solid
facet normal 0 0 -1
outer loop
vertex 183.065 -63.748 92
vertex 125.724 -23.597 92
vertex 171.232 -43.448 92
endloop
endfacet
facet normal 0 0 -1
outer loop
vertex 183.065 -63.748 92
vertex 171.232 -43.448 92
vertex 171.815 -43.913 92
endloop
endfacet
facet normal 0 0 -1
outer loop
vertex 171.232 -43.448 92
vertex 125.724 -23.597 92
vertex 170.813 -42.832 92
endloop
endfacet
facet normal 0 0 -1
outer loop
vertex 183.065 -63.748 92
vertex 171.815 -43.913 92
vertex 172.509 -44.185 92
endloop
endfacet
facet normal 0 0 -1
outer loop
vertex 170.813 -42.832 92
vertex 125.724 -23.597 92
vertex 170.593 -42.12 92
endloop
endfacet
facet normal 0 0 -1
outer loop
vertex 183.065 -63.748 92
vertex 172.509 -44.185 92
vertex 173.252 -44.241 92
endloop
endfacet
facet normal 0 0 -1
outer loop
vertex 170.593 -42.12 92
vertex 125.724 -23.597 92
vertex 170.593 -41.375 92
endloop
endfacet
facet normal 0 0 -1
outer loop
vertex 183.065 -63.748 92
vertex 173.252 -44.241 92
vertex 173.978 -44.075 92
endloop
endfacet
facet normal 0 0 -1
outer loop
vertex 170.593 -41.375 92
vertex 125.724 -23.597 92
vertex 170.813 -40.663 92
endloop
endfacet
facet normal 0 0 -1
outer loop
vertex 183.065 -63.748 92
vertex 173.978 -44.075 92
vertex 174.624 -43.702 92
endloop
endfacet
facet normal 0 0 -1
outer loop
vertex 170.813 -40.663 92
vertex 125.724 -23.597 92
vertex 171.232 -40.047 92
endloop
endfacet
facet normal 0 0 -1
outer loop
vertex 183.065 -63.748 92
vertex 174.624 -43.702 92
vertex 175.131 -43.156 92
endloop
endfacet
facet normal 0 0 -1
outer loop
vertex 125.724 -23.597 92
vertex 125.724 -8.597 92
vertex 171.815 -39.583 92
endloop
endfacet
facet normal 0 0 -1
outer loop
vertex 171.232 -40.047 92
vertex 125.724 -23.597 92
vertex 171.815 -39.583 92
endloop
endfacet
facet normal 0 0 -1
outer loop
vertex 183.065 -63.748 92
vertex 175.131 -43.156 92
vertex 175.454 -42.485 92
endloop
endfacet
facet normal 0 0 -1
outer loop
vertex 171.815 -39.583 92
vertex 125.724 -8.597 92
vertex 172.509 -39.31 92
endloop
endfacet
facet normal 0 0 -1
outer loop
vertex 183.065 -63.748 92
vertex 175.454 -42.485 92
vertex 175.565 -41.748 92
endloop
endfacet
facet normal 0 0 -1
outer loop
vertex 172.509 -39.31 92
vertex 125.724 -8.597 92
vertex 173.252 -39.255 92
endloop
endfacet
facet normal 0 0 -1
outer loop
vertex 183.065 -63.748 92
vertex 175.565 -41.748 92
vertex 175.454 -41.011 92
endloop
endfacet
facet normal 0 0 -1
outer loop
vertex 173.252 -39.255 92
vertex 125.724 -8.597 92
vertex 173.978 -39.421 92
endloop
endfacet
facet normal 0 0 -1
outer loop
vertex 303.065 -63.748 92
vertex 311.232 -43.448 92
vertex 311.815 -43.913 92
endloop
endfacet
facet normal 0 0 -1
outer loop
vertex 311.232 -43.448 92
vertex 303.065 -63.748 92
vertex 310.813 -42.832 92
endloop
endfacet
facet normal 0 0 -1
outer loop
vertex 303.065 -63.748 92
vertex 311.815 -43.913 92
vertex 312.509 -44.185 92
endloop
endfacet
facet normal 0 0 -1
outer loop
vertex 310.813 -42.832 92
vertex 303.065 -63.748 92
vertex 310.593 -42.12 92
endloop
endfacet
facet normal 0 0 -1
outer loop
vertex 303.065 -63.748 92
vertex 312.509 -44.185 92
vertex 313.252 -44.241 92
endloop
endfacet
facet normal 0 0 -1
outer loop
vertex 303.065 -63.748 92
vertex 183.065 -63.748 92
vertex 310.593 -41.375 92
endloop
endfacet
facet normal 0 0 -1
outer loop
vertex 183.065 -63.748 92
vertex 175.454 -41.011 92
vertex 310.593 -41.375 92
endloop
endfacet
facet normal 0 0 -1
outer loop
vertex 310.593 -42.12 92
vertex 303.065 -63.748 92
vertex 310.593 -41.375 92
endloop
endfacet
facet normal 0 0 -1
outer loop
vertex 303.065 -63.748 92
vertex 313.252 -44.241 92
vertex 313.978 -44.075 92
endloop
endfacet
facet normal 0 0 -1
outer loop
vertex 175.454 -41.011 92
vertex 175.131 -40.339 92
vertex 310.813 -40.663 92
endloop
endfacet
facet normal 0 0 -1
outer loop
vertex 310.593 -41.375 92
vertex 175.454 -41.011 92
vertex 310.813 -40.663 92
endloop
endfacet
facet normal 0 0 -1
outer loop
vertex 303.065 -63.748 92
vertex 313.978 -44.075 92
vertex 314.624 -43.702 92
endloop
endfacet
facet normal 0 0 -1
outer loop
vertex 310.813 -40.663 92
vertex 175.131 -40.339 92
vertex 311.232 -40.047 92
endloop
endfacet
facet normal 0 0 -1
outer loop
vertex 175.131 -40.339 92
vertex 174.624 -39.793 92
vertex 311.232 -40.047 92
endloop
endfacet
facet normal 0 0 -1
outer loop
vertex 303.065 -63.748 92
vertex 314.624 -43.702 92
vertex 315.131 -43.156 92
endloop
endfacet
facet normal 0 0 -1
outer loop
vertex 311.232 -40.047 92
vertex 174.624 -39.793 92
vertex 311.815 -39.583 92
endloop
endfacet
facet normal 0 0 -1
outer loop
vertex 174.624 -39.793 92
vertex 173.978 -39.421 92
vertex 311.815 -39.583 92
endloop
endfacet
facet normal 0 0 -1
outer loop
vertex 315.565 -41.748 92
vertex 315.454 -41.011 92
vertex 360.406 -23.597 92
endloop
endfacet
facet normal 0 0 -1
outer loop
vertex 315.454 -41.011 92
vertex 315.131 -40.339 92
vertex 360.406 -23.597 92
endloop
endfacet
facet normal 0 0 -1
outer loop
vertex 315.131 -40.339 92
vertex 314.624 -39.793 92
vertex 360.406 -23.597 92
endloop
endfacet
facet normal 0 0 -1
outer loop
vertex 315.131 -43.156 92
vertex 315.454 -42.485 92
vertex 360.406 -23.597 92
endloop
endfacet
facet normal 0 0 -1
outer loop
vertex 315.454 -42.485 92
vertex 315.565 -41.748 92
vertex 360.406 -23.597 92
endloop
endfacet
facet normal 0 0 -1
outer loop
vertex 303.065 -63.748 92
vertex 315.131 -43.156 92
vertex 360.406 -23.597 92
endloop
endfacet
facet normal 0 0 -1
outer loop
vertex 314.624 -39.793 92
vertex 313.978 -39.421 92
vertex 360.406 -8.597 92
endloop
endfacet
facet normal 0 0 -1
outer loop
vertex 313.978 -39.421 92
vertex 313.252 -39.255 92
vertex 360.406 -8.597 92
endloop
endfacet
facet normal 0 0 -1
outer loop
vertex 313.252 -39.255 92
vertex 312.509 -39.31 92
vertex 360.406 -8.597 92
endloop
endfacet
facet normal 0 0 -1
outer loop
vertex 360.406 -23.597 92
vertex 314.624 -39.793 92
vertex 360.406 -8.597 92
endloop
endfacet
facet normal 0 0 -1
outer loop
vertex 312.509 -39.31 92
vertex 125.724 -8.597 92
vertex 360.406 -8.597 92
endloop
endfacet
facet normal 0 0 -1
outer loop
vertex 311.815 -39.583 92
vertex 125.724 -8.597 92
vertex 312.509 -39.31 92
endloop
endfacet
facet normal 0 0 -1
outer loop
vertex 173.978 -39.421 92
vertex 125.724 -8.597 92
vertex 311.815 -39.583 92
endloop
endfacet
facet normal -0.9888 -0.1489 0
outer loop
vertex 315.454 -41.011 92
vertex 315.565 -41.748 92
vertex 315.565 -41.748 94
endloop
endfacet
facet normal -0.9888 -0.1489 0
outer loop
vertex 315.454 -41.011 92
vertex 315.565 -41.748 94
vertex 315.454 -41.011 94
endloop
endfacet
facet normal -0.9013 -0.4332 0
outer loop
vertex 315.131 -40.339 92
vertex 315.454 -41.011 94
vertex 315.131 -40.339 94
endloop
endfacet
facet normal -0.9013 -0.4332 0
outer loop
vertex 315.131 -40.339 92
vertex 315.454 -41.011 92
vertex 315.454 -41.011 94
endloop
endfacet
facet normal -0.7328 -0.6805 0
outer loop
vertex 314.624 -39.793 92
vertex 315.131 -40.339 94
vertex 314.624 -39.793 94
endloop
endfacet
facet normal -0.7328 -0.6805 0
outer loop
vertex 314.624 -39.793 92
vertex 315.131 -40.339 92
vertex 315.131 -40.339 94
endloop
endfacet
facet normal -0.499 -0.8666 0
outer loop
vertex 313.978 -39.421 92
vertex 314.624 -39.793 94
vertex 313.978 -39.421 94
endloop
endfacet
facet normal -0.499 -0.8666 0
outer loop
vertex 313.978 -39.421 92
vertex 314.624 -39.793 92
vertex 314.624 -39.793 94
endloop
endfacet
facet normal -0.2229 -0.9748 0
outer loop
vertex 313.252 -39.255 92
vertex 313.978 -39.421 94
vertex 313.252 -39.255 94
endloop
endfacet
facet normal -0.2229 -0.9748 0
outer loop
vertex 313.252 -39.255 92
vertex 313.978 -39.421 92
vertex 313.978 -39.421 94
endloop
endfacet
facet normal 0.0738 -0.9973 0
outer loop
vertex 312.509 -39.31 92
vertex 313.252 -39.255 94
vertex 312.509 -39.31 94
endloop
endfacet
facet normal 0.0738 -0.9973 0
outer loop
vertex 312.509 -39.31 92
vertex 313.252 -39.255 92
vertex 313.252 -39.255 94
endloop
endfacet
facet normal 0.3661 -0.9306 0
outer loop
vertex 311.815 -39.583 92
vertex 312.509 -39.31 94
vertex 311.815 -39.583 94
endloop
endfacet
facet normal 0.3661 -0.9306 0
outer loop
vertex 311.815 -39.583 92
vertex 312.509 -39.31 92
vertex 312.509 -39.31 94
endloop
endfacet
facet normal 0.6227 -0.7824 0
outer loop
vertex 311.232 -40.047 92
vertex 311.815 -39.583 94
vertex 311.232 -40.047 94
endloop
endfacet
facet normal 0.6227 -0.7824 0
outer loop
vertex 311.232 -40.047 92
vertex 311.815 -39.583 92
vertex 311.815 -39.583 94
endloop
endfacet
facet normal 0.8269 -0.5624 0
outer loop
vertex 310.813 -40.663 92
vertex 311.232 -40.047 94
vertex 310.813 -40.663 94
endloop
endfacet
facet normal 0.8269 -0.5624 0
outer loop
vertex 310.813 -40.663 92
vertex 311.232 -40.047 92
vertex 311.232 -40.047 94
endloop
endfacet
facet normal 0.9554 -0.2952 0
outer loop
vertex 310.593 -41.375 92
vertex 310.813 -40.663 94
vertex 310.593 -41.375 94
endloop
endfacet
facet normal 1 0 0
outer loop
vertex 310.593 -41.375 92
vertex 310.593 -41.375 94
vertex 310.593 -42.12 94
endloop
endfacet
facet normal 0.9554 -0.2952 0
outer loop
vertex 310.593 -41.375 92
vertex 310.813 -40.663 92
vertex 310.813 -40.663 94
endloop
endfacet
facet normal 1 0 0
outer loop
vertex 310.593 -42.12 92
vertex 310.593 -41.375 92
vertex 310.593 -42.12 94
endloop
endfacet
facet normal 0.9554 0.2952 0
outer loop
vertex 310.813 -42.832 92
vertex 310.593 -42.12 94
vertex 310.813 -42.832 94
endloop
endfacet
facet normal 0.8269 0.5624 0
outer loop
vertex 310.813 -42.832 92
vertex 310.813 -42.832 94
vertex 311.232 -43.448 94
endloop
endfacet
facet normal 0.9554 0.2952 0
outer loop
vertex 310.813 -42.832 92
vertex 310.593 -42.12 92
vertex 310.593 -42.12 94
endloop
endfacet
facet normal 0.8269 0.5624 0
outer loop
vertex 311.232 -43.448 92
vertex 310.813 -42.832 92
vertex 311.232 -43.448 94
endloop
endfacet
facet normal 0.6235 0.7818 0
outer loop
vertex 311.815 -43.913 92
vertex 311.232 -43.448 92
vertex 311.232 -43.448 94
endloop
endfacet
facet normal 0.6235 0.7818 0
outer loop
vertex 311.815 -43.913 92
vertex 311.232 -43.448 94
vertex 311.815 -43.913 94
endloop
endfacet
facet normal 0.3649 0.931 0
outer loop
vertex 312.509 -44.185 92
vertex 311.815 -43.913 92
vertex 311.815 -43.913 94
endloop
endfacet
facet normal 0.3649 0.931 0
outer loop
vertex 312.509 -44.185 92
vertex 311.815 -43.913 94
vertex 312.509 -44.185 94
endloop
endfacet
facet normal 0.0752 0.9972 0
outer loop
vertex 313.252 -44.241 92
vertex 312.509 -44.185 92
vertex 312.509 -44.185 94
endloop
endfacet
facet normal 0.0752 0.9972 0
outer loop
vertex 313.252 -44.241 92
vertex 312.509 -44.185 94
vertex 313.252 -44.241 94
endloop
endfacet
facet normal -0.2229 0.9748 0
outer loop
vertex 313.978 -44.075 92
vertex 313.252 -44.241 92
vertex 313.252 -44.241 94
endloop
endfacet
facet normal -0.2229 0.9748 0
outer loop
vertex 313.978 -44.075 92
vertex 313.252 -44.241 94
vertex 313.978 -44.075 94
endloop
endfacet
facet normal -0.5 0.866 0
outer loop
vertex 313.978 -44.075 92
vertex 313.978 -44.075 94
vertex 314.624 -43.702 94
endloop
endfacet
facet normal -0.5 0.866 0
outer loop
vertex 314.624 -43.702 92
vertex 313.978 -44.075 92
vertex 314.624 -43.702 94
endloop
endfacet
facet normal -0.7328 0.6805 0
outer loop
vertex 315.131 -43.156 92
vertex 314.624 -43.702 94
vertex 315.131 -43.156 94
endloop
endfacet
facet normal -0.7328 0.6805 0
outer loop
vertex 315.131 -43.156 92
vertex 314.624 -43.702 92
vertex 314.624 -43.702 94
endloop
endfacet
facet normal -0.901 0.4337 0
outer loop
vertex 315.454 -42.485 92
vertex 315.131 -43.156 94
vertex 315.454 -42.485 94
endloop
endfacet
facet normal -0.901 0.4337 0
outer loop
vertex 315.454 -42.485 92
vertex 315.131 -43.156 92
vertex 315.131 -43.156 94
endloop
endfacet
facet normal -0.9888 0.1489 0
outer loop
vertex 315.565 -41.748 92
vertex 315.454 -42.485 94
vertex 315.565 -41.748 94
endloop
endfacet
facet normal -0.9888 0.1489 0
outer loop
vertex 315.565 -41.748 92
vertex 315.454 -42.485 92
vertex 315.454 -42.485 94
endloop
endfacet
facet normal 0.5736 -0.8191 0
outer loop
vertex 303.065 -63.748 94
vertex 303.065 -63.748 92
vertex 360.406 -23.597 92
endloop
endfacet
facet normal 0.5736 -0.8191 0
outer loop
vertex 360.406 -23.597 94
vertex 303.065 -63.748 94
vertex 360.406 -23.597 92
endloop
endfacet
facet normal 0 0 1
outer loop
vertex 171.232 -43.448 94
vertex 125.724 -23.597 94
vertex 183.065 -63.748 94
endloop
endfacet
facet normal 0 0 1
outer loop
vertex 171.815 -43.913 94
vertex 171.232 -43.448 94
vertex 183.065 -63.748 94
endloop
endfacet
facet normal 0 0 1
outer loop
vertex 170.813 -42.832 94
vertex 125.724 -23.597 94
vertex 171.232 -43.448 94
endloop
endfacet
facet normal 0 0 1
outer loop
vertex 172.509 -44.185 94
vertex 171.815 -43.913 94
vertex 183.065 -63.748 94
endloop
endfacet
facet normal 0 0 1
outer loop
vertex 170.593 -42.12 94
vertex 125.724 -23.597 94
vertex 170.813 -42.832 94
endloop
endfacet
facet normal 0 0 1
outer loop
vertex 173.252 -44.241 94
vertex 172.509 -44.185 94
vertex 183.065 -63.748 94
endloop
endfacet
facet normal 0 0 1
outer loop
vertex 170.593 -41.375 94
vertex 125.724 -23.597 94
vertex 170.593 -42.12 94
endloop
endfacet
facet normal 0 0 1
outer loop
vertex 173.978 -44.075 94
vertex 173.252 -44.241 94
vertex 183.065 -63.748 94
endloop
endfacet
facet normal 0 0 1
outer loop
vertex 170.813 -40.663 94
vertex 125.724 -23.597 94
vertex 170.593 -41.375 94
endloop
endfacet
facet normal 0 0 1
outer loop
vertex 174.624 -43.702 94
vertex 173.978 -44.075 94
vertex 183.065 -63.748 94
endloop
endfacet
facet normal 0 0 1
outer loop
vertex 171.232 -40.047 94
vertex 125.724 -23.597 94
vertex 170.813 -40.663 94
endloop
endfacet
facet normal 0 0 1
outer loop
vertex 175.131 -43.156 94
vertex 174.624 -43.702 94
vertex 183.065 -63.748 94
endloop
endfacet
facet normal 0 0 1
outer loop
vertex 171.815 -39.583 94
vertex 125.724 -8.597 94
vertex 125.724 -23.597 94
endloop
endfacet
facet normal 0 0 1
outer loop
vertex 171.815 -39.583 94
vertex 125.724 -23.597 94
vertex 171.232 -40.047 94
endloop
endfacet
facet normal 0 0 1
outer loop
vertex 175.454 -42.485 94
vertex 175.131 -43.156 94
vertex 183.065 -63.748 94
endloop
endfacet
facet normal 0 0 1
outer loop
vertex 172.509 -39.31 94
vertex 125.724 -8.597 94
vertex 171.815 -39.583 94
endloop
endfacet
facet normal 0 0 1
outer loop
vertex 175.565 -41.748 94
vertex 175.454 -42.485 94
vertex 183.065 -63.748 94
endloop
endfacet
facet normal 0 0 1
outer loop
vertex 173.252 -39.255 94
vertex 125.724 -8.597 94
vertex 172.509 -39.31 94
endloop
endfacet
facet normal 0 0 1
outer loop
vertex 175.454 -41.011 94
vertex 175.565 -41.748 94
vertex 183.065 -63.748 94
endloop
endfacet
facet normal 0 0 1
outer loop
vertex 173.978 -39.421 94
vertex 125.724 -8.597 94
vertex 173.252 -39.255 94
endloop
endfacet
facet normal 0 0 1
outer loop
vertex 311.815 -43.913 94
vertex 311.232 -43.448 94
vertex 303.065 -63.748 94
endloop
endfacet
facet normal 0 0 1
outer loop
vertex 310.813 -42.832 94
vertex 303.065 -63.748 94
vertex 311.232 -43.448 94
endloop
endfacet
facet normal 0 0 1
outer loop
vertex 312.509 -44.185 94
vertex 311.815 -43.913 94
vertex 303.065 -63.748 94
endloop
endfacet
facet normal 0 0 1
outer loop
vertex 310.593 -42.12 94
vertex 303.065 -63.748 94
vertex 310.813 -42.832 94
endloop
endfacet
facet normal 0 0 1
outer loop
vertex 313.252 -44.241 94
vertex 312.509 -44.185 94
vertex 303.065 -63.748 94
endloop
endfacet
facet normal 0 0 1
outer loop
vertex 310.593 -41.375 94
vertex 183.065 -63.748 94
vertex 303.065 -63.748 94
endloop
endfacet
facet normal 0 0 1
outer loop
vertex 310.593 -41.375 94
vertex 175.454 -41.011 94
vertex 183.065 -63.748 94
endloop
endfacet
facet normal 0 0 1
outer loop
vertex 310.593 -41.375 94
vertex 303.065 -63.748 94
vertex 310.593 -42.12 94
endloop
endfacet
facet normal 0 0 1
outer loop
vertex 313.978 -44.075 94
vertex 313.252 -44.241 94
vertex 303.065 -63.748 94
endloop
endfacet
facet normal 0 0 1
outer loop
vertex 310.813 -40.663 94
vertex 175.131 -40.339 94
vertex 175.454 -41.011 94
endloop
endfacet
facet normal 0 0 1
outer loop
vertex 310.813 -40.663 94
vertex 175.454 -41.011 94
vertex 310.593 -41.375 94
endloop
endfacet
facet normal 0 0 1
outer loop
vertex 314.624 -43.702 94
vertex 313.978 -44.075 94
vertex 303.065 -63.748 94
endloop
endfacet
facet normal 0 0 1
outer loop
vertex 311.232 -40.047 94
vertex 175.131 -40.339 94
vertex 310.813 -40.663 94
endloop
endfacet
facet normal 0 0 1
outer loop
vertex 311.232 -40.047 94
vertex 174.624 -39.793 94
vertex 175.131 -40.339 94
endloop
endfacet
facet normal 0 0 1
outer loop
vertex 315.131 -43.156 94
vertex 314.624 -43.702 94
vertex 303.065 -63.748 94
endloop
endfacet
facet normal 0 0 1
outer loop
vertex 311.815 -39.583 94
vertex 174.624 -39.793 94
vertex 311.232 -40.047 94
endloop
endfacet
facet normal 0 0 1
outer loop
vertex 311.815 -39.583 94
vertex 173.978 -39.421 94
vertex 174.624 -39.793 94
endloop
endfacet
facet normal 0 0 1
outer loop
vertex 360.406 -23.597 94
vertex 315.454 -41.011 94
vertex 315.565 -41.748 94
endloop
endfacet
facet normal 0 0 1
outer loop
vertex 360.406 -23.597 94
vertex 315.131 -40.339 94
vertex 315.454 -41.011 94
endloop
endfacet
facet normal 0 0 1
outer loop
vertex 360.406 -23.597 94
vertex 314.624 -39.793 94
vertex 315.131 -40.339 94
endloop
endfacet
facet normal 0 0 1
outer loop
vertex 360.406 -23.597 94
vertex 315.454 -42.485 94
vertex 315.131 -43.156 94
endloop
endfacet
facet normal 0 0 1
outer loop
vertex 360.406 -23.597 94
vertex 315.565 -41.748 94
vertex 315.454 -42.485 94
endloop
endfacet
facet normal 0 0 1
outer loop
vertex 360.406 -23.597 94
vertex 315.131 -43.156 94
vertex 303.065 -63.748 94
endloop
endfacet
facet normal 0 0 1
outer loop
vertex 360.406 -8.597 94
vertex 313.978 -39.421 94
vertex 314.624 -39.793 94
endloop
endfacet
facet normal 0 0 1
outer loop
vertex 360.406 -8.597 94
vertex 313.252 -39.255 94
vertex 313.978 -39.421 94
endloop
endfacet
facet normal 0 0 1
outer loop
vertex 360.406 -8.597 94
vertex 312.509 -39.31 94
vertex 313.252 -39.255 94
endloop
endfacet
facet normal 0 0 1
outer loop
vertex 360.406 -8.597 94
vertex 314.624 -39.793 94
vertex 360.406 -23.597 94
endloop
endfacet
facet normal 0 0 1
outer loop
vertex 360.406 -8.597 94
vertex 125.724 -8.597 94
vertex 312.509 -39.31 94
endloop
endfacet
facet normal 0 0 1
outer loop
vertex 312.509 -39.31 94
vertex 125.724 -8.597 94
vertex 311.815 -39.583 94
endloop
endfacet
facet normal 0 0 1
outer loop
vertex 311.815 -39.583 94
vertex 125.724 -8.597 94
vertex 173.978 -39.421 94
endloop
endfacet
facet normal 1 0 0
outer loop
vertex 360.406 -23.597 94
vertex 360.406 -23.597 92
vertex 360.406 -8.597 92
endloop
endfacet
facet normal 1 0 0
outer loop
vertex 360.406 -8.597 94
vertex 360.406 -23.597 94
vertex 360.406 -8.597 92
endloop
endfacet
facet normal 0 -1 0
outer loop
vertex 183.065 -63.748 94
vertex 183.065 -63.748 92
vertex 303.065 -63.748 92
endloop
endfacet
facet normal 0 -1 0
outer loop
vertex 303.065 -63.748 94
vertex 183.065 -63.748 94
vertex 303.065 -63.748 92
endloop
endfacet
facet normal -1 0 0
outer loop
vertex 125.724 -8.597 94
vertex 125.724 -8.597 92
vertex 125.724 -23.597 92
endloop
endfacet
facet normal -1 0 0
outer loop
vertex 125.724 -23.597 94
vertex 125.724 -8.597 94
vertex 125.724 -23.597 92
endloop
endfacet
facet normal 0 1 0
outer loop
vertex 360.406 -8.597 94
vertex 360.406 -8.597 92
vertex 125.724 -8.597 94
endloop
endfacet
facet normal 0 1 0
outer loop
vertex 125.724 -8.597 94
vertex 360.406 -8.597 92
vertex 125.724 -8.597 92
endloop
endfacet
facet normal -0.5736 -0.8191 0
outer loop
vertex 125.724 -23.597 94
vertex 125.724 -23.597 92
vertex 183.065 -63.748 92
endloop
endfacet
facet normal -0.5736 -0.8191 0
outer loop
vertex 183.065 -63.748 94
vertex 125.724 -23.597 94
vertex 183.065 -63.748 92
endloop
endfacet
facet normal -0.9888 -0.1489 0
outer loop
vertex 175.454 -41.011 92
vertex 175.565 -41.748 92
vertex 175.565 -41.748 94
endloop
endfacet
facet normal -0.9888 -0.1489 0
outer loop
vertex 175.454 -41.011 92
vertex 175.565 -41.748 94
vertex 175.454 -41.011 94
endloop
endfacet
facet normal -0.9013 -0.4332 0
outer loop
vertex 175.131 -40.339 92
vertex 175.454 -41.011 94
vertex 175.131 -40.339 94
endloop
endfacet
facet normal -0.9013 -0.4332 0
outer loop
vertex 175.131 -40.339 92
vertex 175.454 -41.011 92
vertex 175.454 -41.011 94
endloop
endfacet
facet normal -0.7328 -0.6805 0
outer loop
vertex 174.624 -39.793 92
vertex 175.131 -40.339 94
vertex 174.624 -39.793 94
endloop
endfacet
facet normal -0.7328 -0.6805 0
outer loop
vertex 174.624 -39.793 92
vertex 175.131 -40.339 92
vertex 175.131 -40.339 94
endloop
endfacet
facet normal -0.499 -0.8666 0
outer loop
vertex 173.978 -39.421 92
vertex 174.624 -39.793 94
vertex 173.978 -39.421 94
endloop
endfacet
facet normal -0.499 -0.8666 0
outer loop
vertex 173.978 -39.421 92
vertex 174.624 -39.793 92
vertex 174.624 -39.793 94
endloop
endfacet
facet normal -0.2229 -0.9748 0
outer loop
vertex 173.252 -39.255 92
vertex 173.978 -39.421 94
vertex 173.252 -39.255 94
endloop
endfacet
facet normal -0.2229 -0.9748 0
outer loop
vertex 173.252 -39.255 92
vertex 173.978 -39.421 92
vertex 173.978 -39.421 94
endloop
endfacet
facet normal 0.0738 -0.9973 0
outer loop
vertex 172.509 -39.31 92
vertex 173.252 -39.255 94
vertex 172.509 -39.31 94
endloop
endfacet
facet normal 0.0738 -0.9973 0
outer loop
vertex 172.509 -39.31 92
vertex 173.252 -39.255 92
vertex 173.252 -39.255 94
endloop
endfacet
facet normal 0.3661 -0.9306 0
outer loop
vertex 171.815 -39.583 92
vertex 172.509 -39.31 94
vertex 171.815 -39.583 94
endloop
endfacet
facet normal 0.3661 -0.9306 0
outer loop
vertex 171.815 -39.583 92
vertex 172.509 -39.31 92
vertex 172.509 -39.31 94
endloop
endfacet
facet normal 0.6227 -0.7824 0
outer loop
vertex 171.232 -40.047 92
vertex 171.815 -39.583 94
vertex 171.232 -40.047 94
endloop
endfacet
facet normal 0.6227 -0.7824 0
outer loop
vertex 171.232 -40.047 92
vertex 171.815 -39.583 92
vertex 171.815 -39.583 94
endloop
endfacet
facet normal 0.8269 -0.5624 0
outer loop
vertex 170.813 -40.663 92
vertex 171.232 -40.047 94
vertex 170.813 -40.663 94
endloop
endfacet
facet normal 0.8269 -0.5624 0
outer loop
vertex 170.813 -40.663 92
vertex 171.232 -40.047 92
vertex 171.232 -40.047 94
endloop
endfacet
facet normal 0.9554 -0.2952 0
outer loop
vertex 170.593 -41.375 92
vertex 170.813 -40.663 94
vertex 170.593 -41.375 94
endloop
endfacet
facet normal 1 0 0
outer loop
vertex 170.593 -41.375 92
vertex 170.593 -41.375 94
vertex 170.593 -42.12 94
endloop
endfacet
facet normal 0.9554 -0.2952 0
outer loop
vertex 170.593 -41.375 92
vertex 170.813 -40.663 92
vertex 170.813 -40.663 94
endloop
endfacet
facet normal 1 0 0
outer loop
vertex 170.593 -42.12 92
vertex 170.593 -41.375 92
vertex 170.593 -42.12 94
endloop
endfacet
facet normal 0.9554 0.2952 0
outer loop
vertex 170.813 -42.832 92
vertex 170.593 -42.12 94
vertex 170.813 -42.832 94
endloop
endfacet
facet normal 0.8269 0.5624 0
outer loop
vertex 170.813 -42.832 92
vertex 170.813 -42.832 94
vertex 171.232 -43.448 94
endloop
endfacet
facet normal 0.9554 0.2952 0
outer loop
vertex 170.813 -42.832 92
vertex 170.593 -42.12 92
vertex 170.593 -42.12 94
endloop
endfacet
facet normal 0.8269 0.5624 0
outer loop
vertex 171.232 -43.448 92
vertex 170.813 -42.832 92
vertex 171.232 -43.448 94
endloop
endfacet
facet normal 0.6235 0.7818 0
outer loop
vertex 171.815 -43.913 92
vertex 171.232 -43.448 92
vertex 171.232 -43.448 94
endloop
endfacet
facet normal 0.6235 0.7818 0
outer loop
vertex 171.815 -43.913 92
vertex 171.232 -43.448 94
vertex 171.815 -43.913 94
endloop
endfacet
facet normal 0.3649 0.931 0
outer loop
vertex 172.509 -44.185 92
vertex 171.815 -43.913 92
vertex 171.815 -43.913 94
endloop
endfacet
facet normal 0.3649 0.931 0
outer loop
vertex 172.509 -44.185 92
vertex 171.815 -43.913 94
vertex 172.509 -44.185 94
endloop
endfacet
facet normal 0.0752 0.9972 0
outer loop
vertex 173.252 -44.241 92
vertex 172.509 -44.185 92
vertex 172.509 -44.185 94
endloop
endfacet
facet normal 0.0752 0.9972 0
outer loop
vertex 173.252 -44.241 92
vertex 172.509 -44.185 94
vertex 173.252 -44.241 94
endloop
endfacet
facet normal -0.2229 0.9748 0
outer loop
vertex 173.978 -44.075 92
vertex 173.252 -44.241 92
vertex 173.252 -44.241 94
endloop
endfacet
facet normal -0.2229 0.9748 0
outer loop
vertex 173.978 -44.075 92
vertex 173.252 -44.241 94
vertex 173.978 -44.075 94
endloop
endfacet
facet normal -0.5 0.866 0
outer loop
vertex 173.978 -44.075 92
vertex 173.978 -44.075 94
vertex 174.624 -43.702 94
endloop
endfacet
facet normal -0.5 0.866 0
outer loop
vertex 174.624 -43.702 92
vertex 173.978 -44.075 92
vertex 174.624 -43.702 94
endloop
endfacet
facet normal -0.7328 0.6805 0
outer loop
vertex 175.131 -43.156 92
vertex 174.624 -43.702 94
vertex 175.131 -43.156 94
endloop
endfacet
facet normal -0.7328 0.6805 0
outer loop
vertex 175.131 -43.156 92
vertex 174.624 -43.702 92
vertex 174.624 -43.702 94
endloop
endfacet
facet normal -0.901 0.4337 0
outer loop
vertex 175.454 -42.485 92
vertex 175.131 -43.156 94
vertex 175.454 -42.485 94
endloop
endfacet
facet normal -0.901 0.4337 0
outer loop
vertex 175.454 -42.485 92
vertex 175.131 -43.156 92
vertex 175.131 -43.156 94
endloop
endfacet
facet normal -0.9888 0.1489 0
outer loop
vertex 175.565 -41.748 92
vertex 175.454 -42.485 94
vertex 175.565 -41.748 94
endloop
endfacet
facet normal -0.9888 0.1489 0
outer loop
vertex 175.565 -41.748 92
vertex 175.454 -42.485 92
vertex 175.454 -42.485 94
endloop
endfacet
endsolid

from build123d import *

# Parameters (mm, degrees)
SKETCH1_R           = 2.5
BOSS_EXTRUDE1_DEPTH = 2
CUT_EXTRUDE1_DEPTH  = 10


with BuildPart() as part:
    # Sketch1 → Boss-Extrude1 (new body)
    with BuildSketch(Plane.XY.offset(92)):
        Polygon((26.130057398, -8.597379557), (26.130057398, -23.597379557), (83.470700498, -63.747730101), (402.6593569, -63.747730101), (460, -23.597379557), (460, -8.597379557), align=None)
        with Locations((173.065028699, -41.747730101)):
            Circle(SKETCH1_R, mode=Mode.SUBTRACT)
        with Locations((313.065028699, -41.747730101)):
            Circle(SKETCH1_R, mode=Mode.SUBTRACT)
    extrude(amount=BOSS_EXTRUDE1_DEPTH)

    # Sketch2 → Cut-Extrude1 (cut)
    with BuildSketch(Plane(origin=(0, 0, 92), x_dir=(-1, 0, 0), z_dir=(0, 0, -1))):
        Polygon((-381.8278919, -8.597379557), (-360.405671799, -23.597379557), (-360.405671799, -8.597379557), align=None)
        Polygon((-303.065028699, -63.747730101), (-360.405671799, -23.597379557), (-381.8278919, -8.597379557), (-460, -8.597379557), (-460, -23.597379557), (-402.6593569, -63.747730101), align=None)
        Polygon((-125.724385599, -8.597379557), (-125.724385599, -23.597379557), (-104.302165498, -8.597379557), align=None)
        Polygon((-104.302165498, -8.597379557), (-125.724385599, -23.597379557), (-183.065028699, -63.747730101), (-83.470700498, -63.747730101), (-26.130057398, -23.597379557), (-26.130057398, -8.597379557), align=None)
    extrude(amount=-CUT_EXTRUDE1_DEPTH, mode=Mode.SUBTRACT)


solid = part.part
